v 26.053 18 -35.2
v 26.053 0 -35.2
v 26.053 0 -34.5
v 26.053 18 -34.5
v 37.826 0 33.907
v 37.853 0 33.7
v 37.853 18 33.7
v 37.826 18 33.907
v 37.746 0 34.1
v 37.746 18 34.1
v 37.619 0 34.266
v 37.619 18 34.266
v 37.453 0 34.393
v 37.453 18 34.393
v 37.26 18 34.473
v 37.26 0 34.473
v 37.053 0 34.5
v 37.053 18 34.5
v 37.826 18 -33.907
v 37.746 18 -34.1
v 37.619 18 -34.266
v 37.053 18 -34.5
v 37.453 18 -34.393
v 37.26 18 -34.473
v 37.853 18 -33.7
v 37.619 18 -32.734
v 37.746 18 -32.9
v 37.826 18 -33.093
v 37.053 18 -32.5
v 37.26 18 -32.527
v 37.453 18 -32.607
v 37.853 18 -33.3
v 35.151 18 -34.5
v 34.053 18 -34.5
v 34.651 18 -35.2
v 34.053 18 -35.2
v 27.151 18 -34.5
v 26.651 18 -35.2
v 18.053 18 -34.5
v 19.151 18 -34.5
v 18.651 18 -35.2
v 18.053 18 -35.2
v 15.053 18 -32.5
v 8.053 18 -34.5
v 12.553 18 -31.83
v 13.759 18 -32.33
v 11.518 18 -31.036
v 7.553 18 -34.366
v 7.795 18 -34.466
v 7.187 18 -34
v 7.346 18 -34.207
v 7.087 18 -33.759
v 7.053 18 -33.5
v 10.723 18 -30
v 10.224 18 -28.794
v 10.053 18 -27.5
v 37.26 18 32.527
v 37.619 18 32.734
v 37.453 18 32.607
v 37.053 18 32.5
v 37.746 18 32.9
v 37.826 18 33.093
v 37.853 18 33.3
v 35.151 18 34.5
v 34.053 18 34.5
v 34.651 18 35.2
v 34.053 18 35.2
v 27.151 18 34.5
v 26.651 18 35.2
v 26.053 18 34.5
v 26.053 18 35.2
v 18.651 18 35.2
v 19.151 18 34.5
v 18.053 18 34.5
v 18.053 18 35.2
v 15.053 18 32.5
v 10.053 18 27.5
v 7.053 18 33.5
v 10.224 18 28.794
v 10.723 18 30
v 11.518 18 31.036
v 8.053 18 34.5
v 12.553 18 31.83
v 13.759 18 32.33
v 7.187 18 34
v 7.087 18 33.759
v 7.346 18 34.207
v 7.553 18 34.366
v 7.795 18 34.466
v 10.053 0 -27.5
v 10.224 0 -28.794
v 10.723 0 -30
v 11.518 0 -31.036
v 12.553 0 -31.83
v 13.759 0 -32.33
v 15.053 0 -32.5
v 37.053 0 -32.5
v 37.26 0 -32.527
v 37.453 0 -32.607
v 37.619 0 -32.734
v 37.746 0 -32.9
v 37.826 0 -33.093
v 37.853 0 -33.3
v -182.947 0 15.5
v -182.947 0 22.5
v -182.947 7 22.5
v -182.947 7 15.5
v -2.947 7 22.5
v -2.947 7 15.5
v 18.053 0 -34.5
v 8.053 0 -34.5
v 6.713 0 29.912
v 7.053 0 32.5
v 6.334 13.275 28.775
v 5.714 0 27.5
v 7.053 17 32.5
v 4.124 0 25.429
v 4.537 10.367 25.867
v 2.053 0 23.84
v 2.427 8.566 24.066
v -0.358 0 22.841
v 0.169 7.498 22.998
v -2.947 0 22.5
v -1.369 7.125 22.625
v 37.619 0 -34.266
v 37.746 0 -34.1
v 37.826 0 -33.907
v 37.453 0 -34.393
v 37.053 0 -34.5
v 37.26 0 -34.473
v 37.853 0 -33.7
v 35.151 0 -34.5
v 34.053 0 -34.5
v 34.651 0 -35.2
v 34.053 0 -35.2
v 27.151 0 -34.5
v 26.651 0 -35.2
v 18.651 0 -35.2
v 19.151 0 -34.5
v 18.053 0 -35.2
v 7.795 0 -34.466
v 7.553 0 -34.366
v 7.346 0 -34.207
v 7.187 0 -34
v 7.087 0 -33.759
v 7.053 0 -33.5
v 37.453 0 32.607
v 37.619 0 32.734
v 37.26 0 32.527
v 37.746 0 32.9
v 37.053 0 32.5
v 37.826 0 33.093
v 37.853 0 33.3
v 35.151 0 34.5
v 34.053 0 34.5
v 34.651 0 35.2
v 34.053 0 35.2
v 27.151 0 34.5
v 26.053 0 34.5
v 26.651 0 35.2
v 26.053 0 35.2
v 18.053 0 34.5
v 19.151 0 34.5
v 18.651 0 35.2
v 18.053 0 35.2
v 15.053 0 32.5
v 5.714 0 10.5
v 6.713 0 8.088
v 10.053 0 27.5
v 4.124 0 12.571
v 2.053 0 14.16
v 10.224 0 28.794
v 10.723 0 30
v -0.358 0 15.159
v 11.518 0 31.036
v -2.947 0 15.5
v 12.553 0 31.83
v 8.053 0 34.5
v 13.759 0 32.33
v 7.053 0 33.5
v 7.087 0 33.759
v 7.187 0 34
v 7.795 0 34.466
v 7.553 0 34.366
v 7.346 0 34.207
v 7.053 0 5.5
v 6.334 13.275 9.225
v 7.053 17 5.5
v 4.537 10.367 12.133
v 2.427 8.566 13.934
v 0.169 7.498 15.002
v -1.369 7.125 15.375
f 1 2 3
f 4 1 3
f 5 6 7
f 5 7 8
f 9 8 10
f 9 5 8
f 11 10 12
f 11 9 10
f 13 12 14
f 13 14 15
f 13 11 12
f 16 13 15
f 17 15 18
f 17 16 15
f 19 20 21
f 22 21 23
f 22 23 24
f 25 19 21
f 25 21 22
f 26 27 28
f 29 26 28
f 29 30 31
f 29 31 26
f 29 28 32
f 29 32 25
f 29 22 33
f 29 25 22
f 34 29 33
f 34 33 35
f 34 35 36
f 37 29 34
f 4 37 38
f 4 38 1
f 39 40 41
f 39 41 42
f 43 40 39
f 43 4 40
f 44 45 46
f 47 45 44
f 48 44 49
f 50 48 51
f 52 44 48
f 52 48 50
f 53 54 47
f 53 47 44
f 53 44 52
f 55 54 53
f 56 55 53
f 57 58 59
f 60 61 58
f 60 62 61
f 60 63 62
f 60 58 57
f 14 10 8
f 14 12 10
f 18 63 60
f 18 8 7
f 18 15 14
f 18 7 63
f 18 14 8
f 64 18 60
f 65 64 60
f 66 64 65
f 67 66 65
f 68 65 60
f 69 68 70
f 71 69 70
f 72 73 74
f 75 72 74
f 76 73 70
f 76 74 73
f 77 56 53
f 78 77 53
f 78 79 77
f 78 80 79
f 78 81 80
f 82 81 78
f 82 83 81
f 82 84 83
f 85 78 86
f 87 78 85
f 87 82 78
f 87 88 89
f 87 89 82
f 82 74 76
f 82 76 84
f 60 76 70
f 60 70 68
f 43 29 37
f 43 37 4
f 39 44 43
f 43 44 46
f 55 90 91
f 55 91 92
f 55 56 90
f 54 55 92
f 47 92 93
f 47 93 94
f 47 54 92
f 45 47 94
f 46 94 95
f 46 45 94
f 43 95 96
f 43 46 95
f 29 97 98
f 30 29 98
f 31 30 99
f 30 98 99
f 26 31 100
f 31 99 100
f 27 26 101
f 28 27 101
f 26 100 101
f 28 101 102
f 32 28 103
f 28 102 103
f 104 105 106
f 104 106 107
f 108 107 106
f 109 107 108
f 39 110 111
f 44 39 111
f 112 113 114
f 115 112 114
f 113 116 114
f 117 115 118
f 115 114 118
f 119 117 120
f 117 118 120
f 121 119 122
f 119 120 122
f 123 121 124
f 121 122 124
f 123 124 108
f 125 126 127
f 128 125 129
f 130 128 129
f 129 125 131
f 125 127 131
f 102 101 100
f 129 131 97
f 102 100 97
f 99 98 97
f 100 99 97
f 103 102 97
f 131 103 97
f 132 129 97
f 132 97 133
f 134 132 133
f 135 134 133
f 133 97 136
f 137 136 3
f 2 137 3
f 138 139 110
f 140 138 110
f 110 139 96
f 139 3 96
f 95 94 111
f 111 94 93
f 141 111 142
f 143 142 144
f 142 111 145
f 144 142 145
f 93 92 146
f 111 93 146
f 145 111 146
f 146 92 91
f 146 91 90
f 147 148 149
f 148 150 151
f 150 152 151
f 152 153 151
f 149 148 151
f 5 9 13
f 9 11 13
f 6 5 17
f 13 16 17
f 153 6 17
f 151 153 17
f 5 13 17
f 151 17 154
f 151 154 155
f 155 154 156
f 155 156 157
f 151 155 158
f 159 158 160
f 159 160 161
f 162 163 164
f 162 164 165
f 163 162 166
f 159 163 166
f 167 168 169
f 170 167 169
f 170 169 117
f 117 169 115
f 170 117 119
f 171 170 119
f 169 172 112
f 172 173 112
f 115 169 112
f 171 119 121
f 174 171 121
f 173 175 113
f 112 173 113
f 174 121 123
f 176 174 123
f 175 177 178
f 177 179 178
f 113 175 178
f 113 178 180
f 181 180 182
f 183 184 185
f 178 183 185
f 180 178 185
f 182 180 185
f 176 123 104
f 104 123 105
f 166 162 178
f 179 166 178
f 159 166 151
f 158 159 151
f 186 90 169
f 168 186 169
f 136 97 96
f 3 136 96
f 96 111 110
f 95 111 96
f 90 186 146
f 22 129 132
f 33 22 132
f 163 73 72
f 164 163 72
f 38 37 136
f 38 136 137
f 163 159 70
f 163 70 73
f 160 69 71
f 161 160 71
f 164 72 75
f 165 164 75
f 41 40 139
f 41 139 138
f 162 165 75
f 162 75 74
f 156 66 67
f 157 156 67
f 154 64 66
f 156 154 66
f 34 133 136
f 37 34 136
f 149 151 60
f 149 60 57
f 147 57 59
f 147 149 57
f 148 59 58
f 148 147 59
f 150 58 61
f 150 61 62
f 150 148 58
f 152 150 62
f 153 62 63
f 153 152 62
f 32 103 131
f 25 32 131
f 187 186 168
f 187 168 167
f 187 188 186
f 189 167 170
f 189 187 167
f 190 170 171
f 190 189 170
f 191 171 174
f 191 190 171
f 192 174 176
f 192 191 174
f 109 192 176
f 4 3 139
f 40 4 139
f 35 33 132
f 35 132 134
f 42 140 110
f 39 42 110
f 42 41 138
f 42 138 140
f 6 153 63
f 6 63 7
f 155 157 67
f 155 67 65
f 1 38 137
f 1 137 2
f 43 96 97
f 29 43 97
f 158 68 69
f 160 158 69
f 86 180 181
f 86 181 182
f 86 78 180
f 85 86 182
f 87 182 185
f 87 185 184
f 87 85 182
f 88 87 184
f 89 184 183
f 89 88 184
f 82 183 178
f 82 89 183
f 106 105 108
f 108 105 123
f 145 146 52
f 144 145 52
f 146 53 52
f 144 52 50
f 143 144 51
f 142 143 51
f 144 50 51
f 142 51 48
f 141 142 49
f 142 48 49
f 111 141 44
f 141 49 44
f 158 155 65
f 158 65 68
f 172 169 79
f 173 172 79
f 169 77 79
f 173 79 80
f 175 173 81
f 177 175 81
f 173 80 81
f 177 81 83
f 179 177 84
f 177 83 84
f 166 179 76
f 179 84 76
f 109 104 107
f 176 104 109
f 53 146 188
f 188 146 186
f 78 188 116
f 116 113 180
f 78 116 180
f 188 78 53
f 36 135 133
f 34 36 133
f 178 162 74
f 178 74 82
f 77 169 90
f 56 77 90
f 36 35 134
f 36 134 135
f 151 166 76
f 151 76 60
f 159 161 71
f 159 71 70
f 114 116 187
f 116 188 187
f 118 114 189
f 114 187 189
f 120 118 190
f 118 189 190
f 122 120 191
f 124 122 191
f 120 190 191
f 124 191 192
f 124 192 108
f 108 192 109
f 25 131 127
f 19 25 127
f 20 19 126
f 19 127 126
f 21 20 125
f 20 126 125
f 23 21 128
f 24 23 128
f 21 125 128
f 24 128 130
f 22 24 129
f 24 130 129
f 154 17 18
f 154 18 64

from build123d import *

# Parameters (mm, degrees)
BOSS_EXTRUDE1_DEPTH = 18
FILLET1_R           = 5
FILLET2_R           = 1
SKETCH1_3_W         = 190
SKETCH1_3_H         = 7
BOSS_EXTRUDE2_DEPTH = 7
FILLET3_R           = 10


with BuildPart() as part:
    # Sketch1 → Boss-Extrude1 (new body)
    with BuildSketch(Plane(origin=(0, 0, 0), x_dir=(1, 0, 0), z_dir=(0, 1, 0))):
        with BuildLine():
            Line((7.053352185, -22.5), (7.053352185, -34.5))
            Line((7.053352185, -34.5), (18.053352185, -34.5))
            Line((18.053352185, -34.5), (18.053352185, -35.2))
            Line((18.053352185, -35.2), (18.651371079, -35.2))
            Line((18.651371079, -35.2), (19.151371079, -34.5))
            Line((19.151371079, -34.5), (26.053352185, -34.5))
            Line((26.053352185, -34.5), (26.053352185, -35.2))
            Line((26.053352185, -35.2), (26.651371079, -35.2))
            Line((26.651371079, -35.2), (27.151371079, -34.5))
            Line((27.151371079, -34.5), (34.053352185, -34.5))
            Line((34.053352185, -34.5), (34.053352185, -35.2))
            Line((34.053352185, -35.2), (34.651371079, -35.2))
            Line((34.651371079, -35.2), (35.151371079, -34.5))
            Line((35.151371079, -34.5), (37.053352185, -34.5))
            ThreePointArc((37.053352185, -34.5), (37.61903761, -34.265685425), (37.853352185, -33.7))
            Line((37.853352185, -33.7), (37.853352185, -33.3))
            ThreePointArc((37.853352185, -33.3), (37.61903761, -32.734314575), (37.053352185, -32.5))
            Line((37.053352185, -32.5), (10.053352185, -32.5))
            Line((10.053352185, -32.5), (10.053352185, 0))
            Line((10.053352185, 0), (7.053352185, 0))
            Line((7.053352185, 0), (7.053352185, -15.5))
            Line((7.053352185, -15.5), (7.053352185, -22.5))
        make_face()
    extrude(amount=BOSS_EXTRUDE1_DEPTH)

    # Fillet1
    fillet1_edges = [part.edges().sort_by_distance(p)[0] for p in [
        (10.053352185, 9, 32.5),
    ]]
    fillet(fillet1_edges, radius=FILLET1_R)

    # Fillet2
    fillet2_edges = [part.edges().sort_by_distance(p)[0] for p in [
        (7.053352185, 9, 34.5),
    ]]
    fillet(fillet2_edges, radius=FILLET2_R)

    # Mirror1: part across plane


with BuildPart() as part_1:
    add(part.part)
    add(part.part.mirror(Plane(origin=(0, 18, 0), x_dir=(1, 0, 0), z_dir=(0, 0, -1))))

    # Sketch1<3> → Boss-Extrude2 (add)
    with BuildSketch(Plane(origin=(0, 0, 0), x_dir=(1, 0, 0), z_dir=(0, 1, 0))):
        with Locations((-87.946647815, -19)):
            Rectangle(SKETCH1_3_W, SKETCH1_3_H)
    extrude(amount=BOSS_EXTRUDE2_DEPTH)

    # Fillet3
    fillet3_edges = [part_1.edges().sort_by_distance(p)[0] for p in [
        (7.053352185, 3.5, 22.5),
        (7.053352185, 3.5, 15.5),
        (7.053352185, 7, 19),
    ]]
    fillet(fillet3_edges, radius=FILLET3_R)


solid = part_1.part
